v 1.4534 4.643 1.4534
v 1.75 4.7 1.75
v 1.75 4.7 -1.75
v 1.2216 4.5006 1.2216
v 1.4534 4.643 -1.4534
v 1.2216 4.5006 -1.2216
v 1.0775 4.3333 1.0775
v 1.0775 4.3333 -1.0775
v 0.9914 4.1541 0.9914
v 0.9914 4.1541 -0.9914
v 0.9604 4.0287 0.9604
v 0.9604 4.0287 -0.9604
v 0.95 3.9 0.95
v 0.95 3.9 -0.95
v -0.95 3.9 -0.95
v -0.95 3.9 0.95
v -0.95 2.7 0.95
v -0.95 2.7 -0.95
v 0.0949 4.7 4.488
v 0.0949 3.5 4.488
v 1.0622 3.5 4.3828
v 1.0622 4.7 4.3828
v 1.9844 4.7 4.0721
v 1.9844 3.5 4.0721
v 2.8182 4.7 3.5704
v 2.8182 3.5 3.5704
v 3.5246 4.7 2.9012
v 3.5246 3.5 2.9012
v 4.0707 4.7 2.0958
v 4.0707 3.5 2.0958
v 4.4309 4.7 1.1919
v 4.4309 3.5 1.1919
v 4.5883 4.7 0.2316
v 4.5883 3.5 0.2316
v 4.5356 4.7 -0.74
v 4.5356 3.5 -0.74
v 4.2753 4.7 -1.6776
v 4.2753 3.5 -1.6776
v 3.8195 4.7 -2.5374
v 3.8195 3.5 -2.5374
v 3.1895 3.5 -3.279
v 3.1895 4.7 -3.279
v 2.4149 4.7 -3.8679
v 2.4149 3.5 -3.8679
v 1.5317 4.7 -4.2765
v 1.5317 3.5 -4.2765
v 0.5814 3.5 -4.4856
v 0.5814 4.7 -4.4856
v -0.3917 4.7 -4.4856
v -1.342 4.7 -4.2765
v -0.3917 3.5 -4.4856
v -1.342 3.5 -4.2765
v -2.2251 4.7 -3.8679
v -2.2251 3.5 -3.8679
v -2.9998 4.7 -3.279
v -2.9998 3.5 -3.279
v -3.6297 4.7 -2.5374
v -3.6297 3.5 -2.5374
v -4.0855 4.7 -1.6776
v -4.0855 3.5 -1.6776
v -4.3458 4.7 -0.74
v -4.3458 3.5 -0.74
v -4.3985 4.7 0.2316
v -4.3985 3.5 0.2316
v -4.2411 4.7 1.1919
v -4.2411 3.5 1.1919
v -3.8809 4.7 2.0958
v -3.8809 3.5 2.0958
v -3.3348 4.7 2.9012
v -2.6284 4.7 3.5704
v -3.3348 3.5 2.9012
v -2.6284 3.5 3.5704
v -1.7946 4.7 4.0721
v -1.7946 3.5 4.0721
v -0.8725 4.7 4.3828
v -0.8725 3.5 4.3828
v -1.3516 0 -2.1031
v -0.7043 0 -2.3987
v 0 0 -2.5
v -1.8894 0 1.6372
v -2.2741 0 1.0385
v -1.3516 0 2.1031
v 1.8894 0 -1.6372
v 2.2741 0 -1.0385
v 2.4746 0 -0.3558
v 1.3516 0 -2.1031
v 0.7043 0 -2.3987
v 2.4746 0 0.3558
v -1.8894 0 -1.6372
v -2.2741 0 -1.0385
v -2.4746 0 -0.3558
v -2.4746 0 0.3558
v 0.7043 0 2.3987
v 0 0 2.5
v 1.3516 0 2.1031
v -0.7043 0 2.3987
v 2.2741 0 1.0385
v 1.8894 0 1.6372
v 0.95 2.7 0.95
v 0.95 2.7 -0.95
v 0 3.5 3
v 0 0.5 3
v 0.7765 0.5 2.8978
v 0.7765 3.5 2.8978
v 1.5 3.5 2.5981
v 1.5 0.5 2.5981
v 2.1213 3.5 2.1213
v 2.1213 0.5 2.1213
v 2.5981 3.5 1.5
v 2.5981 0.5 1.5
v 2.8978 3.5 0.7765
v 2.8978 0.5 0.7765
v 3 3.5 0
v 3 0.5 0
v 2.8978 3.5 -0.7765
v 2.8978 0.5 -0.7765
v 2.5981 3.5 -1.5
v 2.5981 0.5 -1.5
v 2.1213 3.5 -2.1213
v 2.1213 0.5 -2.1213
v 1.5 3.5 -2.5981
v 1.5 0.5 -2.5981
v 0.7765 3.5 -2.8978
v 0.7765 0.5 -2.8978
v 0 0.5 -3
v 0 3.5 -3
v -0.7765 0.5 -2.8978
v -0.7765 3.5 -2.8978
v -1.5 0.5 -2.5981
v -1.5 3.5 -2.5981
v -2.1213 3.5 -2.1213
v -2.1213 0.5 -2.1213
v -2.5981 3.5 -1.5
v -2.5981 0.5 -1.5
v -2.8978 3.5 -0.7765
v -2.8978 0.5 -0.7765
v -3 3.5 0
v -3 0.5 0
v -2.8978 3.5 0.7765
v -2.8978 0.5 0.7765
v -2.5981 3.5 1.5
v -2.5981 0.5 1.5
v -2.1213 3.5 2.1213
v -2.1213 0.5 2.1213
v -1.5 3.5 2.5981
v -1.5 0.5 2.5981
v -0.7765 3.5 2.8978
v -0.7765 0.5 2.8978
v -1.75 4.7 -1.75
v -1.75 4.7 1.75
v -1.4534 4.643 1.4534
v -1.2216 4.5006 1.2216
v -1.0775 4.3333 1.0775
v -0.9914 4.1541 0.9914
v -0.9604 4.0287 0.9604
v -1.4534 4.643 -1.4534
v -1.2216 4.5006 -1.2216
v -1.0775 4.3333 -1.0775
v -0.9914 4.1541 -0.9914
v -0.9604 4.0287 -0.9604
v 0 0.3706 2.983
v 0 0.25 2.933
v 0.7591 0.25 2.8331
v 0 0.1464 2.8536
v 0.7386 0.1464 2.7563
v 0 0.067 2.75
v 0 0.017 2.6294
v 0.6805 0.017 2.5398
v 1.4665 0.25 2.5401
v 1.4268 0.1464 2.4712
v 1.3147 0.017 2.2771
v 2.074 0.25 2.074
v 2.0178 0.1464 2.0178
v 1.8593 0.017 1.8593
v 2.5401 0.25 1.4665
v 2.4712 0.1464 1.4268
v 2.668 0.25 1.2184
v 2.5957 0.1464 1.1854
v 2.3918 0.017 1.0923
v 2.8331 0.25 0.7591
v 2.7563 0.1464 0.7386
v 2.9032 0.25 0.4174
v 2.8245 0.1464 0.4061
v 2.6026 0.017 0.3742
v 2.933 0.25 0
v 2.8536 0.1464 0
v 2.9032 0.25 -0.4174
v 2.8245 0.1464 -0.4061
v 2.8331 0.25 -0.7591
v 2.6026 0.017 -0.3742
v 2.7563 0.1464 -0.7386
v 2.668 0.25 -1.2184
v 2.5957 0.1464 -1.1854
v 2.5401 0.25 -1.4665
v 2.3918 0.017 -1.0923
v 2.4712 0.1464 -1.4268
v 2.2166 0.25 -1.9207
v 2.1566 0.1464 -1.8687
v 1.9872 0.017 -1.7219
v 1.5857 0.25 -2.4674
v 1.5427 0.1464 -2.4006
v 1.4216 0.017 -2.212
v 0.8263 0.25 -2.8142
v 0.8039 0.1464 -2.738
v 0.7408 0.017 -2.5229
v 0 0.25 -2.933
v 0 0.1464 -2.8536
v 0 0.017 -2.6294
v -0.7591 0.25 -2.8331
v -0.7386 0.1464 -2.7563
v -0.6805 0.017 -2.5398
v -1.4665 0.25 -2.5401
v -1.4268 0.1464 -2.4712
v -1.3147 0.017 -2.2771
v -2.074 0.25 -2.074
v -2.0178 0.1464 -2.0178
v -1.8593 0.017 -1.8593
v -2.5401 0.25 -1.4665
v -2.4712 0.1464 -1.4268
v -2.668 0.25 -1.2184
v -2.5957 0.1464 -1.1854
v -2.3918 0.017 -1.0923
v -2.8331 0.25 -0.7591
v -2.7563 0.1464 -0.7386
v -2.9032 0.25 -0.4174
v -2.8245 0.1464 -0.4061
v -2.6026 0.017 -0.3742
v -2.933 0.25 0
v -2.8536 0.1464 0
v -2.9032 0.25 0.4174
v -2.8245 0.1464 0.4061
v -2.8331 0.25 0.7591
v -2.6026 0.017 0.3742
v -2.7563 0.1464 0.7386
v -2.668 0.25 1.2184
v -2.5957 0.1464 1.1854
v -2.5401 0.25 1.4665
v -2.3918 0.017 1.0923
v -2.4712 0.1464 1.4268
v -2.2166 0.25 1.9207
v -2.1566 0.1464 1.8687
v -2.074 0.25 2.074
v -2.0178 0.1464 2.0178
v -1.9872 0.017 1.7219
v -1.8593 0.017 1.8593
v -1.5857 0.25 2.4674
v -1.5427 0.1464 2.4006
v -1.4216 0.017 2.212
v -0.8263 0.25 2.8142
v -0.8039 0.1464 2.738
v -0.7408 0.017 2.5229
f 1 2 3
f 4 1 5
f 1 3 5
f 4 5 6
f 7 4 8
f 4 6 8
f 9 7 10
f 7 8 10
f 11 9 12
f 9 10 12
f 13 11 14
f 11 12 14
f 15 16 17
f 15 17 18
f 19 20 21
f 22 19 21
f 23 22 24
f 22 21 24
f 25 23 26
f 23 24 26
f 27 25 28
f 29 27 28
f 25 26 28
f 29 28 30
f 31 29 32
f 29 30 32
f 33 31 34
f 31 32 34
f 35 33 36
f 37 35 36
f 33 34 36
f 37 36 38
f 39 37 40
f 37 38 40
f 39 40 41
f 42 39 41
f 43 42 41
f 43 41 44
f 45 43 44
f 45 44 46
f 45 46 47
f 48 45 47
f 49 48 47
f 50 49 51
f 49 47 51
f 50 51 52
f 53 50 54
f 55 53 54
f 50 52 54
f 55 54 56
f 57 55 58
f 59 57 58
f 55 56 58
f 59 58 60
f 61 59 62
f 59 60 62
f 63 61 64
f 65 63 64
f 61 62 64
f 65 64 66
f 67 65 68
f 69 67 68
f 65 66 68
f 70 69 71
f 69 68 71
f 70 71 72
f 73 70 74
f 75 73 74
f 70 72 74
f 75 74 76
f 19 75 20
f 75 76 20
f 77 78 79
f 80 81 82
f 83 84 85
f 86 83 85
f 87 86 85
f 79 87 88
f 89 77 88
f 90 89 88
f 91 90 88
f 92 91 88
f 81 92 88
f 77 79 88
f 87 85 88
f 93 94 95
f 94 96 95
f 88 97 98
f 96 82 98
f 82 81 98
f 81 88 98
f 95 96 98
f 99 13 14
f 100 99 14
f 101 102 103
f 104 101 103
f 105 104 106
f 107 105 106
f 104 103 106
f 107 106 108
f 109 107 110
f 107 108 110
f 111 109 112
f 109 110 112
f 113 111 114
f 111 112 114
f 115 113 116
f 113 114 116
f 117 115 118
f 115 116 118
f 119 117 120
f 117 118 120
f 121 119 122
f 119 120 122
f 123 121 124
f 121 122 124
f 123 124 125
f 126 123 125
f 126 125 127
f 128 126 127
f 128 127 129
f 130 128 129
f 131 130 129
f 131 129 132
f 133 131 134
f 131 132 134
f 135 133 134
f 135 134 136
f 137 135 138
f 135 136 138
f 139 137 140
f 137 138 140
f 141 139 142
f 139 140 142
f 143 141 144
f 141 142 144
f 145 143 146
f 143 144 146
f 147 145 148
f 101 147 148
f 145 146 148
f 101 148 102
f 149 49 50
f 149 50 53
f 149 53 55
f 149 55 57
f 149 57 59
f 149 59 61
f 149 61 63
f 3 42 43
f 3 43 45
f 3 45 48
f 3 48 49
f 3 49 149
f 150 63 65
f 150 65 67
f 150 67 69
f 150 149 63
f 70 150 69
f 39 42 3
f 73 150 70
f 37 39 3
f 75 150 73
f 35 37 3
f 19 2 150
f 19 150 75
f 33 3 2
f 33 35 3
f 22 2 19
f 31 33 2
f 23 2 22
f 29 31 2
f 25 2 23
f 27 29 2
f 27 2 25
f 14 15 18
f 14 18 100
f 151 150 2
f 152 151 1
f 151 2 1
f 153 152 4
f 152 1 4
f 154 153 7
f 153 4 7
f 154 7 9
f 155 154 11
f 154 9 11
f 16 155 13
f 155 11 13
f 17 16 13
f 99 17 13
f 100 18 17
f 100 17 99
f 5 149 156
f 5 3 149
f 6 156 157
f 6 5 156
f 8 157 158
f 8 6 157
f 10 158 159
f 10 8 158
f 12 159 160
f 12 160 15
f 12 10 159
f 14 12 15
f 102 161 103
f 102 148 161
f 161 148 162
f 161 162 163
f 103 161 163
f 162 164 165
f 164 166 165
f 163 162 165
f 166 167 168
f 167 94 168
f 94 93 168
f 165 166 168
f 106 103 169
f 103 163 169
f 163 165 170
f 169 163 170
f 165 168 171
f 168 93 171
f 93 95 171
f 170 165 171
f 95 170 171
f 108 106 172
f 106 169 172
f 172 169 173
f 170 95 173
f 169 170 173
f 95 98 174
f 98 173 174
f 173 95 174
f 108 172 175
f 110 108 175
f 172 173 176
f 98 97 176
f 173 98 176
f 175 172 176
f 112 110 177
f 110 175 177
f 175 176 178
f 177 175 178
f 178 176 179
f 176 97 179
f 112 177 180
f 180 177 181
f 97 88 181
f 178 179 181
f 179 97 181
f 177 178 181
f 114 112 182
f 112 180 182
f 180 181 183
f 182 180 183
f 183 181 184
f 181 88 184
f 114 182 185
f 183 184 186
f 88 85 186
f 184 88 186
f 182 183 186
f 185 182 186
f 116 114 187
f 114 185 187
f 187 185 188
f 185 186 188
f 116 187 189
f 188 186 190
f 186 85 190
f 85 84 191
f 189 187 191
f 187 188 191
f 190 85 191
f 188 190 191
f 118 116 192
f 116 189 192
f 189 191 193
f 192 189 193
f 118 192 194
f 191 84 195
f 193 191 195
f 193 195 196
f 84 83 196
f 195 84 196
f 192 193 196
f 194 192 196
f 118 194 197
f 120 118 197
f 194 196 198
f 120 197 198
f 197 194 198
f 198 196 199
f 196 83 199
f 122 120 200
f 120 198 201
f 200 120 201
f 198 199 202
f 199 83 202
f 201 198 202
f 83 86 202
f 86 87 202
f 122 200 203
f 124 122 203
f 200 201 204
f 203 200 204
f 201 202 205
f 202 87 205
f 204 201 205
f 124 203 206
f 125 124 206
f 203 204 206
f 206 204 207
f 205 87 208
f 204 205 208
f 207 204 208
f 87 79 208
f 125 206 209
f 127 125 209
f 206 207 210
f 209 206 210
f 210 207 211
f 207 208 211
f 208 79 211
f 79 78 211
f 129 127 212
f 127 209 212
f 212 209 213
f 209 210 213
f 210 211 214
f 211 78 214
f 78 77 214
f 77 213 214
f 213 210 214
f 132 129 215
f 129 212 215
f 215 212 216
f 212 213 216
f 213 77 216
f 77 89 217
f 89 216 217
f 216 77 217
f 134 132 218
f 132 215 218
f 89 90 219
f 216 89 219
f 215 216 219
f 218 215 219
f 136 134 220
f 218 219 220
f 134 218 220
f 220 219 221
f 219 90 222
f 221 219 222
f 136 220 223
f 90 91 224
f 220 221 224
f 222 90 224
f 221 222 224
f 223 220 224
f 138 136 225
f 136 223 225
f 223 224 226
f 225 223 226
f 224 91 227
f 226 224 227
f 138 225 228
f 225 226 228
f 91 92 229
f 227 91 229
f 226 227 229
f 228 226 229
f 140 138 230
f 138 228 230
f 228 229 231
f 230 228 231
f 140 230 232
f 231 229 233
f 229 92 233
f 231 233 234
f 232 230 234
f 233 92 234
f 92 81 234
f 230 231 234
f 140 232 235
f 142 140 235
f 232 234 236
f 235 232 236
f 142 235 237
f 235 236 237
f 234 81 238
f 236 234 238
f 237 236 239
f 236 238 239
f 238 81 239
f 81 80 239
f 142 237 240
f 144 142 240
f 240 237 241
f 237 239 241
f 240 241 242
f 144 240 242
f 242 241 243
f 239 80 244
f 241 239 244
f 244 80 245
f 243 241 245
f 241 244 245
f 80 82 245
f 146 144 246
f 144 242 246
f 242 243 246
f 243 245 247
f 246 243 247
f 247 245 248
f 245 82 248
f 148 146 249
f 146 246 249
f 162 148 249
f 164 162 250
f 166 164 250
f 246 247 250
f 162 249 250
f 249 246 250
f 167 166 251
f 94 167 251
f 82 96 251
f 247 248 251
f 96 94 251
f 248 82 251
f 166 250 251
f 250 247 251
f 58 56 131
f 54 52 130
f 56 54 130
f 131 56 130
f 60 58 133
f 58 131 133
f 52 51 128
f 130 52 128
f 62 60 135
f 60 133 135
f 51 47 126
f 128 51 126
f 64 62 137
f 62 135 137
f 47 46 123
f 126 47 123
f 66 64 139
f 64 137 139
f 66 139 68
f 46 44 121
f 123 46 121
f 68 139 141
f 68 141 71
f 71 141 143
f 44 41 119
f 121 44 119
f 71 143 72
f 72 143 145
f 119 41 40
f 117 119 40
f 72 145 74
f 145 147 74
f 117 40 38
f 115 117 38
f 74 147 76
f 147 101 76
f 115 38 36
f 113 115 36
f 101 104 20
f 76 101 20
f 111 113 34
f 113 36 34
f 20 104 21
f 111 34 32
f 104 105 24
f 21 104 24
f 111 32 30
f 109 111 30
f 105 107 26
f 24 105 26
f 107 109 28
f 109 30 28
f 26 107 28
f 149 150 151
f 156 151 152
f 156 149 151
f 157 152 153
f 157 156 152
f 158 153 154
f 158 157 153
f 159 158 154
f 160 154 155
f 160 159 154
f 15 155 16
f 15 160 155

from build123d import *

# Parameters (mm, degrees)
SKETCH_1_R          = 3
EXTRUDE_1_DEPTH     = 3.5
SKETCH_2_R          = 4.5
EXTRUDE_2_DEPTH     = 1.2
SKETCH_4_W          = 1.9
SKETCH_4_H          = 1.9
CUT_EXTRUDE_1_DEPTH = 2
FILLET_1_R          = 0.5
FILLET_2_R          = 0.8


with BuildPart() as part:
    # 草图1 → 凸台-拉伸1 (new body)
    with BuildSketch(Plane(origin=(0, 0, 0), x_dir=(1, 0, 0), z_dir=(0, 1, 0))):
        with Locations(Location((0, 0, 0), (0, 0, 270))):
            Circle(SKETCH_1_R)
    extrude(amount=EXTRUDE_1_DEPTH)

    # 草图2 → 凸台-拉伸2 (add)
    with BuildSketch(Plane(origin=(0, 3.5, 0), x_dir=(1, 0, 0), z_dir=(0, 1, 0))):
        with Locations(Location((0.094879954, 0.012027373, 0), (0, 0, 270))):
            Circle(SKETCH_2_R)
    extrude(amount=EXTRUDE_2_DEPTH)

    # 草图4 → 切除-拉伸1 (cut)
    with BuildSketch(Plane(origin=(0, 4.7, 0), x_dir=(1, 0, 0), z_dir=(0, 1, 0))):
        Rectangle(SKETCH_4_W, SKETCH_4_H)
    extrude(amount=-CUT_EXTRUDE_1_DEPTH, mode=Mode.SUBTRACT)

    # 圆角1
    fillet_1_edges = [part.edges().sort_by_distance(p)[0] for p in [
        (0, 0, -3),
    ]]
    fillet(fillet_1_edges, radius=FILLET_1_R)

    # 圆角2
    fillet_2_edges = [part.edges().sort_by_distance(p)[0] for p in [
        (-0.95, 4.7, 0),
        (0, 4.7, 0.95),
        (0.95, 4.7, 0),
        (0, 4.7, -0.95),
    ]]
    fillet(fillet_2_edges, radius=FILLET_2_R)


solid = part.part
